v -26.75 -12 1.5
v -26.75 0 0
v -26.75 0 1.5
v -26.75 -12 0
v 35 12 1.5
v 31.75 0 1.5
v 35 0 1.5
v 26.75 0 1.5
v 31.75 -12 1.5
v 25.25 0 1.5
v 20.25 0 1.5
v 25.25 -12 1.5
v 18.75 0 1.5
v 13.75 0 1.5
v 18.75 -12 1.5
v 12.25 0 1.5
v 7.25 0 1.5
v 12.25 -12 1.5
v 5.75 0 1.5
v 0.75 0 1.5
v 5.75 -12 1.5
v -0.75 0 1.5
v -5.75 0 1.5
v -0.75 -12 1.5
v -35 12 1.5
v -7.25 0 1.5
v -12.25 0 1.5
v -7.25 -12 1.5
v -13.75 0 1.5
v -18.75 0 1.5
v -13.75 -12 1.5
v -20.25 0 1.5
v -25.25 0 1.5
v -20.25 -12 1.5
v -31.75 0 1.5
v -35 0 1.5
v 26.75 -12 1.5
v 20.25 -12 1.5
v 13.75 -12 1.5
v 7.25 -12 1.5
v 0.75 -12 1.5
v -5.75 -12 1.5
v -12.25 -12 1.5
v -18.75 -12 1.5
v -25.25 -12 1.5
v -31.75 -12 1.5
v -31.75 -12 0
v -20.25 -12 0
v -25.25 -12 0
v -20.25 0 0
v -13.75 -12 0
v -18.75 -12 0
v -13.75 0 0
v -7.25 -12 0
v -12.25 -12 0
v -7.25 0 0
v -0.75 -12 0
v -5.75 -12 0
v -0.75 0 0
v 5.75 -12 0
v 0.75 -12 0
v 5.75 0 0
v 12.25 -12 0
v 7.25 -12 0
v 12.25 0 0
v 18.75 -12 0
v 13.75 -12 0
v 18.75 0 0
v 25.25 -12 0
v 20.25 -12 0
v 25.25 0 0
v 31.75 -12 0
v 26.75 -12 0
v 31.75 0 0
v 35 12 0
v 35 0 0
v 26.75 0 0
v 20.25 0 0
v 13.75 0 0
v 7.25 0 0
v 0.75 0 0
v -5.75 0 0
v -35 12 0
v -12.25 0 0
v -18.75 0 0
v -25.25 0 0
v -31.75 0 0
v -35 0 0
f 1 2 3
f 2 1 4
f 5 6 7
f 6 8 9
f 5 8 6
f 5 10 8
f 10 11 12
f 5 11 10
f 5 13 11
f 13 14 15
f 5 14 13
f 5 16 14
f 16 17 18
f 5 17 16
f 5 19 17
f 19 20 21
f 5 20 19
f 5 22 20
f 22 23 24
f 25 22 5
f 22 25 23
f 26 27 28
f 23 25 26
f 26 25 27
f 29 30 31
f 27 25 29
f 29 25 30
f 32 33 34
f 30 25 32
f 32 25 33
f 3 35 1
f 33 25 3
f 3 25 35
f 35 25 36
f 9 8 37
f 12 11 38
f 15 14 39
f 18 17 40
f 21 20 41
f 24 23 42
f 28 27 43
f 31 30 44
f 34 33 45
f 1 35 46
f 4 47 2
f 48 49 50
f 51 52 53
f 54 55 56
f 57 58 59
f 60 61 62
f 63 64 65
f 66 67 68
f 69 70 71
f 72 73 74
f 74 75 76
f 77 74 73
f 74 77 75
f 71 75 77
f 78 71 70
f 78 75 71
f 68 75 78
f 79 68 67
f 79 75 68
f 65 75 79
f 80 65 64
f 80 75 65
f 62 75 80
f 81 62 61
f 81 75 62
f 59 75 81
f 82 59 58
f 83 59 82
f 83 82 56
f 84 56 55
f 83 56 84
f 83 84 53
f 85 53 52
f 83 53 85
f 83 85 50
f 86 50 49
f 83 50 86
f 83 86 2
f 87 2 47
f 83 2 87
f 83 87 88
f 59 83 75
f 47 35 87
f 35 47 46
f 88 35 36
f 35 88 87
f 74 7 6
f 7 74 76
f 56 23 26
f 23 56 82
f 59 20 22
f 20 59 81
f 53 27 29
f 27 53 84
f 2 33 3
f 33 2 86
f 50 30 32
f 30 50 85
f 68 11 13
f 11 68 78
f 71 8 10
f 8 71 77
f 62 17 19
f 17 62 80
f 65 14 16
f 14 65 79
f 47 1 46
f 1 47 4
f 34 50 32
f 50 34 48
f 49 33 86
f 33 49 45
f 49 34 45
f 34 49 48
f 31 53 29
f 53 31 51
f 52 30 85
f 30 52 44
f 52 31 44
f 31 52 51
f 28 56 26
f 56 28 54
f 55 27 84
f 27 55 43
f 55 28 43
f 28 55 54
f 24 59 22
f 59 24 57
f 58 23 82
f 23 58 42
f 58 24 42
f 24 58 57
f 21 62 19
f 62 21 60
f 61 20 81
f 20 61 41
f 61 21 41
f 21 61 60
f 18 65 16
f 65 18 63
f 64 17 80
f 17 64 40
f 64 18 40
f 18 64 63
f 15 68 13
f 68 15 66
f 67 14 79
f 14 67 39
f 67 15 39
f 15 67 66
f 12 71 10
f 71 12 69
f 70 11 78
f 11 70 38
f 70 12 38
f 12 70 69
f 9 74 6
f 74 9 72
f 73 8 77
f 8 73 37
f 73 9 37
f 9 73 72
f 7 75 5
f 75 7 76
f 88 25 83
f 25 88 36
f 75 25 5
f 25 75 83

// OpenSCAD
// 10-well agarose gel comb, printed flat (Z = thickness)

// --- dimensions (mm) ---
plate_thick   = 1.5;   // Z thickness of the whole comb
spine_len     = 70;    // X length of the back bar (spine)
spine_width   = 12;    // Y width of the back bar
tooth_w       = 5.0;   // X width of each tooth
tooth_len     = 12;    // Y length of each tooth (hangs in -Y from the spine)
gap           = 1.5;   // X gap between neighbouring teeth
n_tooth       = 10;    // number of teeth

// --- derived layout ---
tooth_pitch   = tooth_w + gap;                       // centre-to-centre spacing in X
row_width     = n_tooth * tooth_w + (n_tooth - 1) * gap; // total X span of the tooth row
row_start_x   = -row_width / 2 + tooth_w / 2;        // X of the first tooth centre (row centred on origin)

// Y positions: spine occupies y = 0 .. spine_width; teeth hang in -Y
spine_y0      = 0;
spine_y1      = spine_width;
tooth_y0      = -tooth_len;
tooth_y1      = 0;

// --- build the comb ---
$fn = 64;

union() {
    // back bar (spine)
    translate([-spine_len / 2, spine_y0, 0])
        cube([spine_len, spine_width, plate_thick], center = [false, false, false]);

    // 10 teeth, each a rectangular prism hanging in -Y from the spine
    for (i = [0 : n_tooth - 1]) {
        tx = row_start_x + i * tooth_pitch;   // X centre of tooth i
        translate([tx - tooth_w / 2, tooth_y0, 0])
            cube([tooth_w, tooth_len, plate_thick], center = [false, false, false]);
    }
}
